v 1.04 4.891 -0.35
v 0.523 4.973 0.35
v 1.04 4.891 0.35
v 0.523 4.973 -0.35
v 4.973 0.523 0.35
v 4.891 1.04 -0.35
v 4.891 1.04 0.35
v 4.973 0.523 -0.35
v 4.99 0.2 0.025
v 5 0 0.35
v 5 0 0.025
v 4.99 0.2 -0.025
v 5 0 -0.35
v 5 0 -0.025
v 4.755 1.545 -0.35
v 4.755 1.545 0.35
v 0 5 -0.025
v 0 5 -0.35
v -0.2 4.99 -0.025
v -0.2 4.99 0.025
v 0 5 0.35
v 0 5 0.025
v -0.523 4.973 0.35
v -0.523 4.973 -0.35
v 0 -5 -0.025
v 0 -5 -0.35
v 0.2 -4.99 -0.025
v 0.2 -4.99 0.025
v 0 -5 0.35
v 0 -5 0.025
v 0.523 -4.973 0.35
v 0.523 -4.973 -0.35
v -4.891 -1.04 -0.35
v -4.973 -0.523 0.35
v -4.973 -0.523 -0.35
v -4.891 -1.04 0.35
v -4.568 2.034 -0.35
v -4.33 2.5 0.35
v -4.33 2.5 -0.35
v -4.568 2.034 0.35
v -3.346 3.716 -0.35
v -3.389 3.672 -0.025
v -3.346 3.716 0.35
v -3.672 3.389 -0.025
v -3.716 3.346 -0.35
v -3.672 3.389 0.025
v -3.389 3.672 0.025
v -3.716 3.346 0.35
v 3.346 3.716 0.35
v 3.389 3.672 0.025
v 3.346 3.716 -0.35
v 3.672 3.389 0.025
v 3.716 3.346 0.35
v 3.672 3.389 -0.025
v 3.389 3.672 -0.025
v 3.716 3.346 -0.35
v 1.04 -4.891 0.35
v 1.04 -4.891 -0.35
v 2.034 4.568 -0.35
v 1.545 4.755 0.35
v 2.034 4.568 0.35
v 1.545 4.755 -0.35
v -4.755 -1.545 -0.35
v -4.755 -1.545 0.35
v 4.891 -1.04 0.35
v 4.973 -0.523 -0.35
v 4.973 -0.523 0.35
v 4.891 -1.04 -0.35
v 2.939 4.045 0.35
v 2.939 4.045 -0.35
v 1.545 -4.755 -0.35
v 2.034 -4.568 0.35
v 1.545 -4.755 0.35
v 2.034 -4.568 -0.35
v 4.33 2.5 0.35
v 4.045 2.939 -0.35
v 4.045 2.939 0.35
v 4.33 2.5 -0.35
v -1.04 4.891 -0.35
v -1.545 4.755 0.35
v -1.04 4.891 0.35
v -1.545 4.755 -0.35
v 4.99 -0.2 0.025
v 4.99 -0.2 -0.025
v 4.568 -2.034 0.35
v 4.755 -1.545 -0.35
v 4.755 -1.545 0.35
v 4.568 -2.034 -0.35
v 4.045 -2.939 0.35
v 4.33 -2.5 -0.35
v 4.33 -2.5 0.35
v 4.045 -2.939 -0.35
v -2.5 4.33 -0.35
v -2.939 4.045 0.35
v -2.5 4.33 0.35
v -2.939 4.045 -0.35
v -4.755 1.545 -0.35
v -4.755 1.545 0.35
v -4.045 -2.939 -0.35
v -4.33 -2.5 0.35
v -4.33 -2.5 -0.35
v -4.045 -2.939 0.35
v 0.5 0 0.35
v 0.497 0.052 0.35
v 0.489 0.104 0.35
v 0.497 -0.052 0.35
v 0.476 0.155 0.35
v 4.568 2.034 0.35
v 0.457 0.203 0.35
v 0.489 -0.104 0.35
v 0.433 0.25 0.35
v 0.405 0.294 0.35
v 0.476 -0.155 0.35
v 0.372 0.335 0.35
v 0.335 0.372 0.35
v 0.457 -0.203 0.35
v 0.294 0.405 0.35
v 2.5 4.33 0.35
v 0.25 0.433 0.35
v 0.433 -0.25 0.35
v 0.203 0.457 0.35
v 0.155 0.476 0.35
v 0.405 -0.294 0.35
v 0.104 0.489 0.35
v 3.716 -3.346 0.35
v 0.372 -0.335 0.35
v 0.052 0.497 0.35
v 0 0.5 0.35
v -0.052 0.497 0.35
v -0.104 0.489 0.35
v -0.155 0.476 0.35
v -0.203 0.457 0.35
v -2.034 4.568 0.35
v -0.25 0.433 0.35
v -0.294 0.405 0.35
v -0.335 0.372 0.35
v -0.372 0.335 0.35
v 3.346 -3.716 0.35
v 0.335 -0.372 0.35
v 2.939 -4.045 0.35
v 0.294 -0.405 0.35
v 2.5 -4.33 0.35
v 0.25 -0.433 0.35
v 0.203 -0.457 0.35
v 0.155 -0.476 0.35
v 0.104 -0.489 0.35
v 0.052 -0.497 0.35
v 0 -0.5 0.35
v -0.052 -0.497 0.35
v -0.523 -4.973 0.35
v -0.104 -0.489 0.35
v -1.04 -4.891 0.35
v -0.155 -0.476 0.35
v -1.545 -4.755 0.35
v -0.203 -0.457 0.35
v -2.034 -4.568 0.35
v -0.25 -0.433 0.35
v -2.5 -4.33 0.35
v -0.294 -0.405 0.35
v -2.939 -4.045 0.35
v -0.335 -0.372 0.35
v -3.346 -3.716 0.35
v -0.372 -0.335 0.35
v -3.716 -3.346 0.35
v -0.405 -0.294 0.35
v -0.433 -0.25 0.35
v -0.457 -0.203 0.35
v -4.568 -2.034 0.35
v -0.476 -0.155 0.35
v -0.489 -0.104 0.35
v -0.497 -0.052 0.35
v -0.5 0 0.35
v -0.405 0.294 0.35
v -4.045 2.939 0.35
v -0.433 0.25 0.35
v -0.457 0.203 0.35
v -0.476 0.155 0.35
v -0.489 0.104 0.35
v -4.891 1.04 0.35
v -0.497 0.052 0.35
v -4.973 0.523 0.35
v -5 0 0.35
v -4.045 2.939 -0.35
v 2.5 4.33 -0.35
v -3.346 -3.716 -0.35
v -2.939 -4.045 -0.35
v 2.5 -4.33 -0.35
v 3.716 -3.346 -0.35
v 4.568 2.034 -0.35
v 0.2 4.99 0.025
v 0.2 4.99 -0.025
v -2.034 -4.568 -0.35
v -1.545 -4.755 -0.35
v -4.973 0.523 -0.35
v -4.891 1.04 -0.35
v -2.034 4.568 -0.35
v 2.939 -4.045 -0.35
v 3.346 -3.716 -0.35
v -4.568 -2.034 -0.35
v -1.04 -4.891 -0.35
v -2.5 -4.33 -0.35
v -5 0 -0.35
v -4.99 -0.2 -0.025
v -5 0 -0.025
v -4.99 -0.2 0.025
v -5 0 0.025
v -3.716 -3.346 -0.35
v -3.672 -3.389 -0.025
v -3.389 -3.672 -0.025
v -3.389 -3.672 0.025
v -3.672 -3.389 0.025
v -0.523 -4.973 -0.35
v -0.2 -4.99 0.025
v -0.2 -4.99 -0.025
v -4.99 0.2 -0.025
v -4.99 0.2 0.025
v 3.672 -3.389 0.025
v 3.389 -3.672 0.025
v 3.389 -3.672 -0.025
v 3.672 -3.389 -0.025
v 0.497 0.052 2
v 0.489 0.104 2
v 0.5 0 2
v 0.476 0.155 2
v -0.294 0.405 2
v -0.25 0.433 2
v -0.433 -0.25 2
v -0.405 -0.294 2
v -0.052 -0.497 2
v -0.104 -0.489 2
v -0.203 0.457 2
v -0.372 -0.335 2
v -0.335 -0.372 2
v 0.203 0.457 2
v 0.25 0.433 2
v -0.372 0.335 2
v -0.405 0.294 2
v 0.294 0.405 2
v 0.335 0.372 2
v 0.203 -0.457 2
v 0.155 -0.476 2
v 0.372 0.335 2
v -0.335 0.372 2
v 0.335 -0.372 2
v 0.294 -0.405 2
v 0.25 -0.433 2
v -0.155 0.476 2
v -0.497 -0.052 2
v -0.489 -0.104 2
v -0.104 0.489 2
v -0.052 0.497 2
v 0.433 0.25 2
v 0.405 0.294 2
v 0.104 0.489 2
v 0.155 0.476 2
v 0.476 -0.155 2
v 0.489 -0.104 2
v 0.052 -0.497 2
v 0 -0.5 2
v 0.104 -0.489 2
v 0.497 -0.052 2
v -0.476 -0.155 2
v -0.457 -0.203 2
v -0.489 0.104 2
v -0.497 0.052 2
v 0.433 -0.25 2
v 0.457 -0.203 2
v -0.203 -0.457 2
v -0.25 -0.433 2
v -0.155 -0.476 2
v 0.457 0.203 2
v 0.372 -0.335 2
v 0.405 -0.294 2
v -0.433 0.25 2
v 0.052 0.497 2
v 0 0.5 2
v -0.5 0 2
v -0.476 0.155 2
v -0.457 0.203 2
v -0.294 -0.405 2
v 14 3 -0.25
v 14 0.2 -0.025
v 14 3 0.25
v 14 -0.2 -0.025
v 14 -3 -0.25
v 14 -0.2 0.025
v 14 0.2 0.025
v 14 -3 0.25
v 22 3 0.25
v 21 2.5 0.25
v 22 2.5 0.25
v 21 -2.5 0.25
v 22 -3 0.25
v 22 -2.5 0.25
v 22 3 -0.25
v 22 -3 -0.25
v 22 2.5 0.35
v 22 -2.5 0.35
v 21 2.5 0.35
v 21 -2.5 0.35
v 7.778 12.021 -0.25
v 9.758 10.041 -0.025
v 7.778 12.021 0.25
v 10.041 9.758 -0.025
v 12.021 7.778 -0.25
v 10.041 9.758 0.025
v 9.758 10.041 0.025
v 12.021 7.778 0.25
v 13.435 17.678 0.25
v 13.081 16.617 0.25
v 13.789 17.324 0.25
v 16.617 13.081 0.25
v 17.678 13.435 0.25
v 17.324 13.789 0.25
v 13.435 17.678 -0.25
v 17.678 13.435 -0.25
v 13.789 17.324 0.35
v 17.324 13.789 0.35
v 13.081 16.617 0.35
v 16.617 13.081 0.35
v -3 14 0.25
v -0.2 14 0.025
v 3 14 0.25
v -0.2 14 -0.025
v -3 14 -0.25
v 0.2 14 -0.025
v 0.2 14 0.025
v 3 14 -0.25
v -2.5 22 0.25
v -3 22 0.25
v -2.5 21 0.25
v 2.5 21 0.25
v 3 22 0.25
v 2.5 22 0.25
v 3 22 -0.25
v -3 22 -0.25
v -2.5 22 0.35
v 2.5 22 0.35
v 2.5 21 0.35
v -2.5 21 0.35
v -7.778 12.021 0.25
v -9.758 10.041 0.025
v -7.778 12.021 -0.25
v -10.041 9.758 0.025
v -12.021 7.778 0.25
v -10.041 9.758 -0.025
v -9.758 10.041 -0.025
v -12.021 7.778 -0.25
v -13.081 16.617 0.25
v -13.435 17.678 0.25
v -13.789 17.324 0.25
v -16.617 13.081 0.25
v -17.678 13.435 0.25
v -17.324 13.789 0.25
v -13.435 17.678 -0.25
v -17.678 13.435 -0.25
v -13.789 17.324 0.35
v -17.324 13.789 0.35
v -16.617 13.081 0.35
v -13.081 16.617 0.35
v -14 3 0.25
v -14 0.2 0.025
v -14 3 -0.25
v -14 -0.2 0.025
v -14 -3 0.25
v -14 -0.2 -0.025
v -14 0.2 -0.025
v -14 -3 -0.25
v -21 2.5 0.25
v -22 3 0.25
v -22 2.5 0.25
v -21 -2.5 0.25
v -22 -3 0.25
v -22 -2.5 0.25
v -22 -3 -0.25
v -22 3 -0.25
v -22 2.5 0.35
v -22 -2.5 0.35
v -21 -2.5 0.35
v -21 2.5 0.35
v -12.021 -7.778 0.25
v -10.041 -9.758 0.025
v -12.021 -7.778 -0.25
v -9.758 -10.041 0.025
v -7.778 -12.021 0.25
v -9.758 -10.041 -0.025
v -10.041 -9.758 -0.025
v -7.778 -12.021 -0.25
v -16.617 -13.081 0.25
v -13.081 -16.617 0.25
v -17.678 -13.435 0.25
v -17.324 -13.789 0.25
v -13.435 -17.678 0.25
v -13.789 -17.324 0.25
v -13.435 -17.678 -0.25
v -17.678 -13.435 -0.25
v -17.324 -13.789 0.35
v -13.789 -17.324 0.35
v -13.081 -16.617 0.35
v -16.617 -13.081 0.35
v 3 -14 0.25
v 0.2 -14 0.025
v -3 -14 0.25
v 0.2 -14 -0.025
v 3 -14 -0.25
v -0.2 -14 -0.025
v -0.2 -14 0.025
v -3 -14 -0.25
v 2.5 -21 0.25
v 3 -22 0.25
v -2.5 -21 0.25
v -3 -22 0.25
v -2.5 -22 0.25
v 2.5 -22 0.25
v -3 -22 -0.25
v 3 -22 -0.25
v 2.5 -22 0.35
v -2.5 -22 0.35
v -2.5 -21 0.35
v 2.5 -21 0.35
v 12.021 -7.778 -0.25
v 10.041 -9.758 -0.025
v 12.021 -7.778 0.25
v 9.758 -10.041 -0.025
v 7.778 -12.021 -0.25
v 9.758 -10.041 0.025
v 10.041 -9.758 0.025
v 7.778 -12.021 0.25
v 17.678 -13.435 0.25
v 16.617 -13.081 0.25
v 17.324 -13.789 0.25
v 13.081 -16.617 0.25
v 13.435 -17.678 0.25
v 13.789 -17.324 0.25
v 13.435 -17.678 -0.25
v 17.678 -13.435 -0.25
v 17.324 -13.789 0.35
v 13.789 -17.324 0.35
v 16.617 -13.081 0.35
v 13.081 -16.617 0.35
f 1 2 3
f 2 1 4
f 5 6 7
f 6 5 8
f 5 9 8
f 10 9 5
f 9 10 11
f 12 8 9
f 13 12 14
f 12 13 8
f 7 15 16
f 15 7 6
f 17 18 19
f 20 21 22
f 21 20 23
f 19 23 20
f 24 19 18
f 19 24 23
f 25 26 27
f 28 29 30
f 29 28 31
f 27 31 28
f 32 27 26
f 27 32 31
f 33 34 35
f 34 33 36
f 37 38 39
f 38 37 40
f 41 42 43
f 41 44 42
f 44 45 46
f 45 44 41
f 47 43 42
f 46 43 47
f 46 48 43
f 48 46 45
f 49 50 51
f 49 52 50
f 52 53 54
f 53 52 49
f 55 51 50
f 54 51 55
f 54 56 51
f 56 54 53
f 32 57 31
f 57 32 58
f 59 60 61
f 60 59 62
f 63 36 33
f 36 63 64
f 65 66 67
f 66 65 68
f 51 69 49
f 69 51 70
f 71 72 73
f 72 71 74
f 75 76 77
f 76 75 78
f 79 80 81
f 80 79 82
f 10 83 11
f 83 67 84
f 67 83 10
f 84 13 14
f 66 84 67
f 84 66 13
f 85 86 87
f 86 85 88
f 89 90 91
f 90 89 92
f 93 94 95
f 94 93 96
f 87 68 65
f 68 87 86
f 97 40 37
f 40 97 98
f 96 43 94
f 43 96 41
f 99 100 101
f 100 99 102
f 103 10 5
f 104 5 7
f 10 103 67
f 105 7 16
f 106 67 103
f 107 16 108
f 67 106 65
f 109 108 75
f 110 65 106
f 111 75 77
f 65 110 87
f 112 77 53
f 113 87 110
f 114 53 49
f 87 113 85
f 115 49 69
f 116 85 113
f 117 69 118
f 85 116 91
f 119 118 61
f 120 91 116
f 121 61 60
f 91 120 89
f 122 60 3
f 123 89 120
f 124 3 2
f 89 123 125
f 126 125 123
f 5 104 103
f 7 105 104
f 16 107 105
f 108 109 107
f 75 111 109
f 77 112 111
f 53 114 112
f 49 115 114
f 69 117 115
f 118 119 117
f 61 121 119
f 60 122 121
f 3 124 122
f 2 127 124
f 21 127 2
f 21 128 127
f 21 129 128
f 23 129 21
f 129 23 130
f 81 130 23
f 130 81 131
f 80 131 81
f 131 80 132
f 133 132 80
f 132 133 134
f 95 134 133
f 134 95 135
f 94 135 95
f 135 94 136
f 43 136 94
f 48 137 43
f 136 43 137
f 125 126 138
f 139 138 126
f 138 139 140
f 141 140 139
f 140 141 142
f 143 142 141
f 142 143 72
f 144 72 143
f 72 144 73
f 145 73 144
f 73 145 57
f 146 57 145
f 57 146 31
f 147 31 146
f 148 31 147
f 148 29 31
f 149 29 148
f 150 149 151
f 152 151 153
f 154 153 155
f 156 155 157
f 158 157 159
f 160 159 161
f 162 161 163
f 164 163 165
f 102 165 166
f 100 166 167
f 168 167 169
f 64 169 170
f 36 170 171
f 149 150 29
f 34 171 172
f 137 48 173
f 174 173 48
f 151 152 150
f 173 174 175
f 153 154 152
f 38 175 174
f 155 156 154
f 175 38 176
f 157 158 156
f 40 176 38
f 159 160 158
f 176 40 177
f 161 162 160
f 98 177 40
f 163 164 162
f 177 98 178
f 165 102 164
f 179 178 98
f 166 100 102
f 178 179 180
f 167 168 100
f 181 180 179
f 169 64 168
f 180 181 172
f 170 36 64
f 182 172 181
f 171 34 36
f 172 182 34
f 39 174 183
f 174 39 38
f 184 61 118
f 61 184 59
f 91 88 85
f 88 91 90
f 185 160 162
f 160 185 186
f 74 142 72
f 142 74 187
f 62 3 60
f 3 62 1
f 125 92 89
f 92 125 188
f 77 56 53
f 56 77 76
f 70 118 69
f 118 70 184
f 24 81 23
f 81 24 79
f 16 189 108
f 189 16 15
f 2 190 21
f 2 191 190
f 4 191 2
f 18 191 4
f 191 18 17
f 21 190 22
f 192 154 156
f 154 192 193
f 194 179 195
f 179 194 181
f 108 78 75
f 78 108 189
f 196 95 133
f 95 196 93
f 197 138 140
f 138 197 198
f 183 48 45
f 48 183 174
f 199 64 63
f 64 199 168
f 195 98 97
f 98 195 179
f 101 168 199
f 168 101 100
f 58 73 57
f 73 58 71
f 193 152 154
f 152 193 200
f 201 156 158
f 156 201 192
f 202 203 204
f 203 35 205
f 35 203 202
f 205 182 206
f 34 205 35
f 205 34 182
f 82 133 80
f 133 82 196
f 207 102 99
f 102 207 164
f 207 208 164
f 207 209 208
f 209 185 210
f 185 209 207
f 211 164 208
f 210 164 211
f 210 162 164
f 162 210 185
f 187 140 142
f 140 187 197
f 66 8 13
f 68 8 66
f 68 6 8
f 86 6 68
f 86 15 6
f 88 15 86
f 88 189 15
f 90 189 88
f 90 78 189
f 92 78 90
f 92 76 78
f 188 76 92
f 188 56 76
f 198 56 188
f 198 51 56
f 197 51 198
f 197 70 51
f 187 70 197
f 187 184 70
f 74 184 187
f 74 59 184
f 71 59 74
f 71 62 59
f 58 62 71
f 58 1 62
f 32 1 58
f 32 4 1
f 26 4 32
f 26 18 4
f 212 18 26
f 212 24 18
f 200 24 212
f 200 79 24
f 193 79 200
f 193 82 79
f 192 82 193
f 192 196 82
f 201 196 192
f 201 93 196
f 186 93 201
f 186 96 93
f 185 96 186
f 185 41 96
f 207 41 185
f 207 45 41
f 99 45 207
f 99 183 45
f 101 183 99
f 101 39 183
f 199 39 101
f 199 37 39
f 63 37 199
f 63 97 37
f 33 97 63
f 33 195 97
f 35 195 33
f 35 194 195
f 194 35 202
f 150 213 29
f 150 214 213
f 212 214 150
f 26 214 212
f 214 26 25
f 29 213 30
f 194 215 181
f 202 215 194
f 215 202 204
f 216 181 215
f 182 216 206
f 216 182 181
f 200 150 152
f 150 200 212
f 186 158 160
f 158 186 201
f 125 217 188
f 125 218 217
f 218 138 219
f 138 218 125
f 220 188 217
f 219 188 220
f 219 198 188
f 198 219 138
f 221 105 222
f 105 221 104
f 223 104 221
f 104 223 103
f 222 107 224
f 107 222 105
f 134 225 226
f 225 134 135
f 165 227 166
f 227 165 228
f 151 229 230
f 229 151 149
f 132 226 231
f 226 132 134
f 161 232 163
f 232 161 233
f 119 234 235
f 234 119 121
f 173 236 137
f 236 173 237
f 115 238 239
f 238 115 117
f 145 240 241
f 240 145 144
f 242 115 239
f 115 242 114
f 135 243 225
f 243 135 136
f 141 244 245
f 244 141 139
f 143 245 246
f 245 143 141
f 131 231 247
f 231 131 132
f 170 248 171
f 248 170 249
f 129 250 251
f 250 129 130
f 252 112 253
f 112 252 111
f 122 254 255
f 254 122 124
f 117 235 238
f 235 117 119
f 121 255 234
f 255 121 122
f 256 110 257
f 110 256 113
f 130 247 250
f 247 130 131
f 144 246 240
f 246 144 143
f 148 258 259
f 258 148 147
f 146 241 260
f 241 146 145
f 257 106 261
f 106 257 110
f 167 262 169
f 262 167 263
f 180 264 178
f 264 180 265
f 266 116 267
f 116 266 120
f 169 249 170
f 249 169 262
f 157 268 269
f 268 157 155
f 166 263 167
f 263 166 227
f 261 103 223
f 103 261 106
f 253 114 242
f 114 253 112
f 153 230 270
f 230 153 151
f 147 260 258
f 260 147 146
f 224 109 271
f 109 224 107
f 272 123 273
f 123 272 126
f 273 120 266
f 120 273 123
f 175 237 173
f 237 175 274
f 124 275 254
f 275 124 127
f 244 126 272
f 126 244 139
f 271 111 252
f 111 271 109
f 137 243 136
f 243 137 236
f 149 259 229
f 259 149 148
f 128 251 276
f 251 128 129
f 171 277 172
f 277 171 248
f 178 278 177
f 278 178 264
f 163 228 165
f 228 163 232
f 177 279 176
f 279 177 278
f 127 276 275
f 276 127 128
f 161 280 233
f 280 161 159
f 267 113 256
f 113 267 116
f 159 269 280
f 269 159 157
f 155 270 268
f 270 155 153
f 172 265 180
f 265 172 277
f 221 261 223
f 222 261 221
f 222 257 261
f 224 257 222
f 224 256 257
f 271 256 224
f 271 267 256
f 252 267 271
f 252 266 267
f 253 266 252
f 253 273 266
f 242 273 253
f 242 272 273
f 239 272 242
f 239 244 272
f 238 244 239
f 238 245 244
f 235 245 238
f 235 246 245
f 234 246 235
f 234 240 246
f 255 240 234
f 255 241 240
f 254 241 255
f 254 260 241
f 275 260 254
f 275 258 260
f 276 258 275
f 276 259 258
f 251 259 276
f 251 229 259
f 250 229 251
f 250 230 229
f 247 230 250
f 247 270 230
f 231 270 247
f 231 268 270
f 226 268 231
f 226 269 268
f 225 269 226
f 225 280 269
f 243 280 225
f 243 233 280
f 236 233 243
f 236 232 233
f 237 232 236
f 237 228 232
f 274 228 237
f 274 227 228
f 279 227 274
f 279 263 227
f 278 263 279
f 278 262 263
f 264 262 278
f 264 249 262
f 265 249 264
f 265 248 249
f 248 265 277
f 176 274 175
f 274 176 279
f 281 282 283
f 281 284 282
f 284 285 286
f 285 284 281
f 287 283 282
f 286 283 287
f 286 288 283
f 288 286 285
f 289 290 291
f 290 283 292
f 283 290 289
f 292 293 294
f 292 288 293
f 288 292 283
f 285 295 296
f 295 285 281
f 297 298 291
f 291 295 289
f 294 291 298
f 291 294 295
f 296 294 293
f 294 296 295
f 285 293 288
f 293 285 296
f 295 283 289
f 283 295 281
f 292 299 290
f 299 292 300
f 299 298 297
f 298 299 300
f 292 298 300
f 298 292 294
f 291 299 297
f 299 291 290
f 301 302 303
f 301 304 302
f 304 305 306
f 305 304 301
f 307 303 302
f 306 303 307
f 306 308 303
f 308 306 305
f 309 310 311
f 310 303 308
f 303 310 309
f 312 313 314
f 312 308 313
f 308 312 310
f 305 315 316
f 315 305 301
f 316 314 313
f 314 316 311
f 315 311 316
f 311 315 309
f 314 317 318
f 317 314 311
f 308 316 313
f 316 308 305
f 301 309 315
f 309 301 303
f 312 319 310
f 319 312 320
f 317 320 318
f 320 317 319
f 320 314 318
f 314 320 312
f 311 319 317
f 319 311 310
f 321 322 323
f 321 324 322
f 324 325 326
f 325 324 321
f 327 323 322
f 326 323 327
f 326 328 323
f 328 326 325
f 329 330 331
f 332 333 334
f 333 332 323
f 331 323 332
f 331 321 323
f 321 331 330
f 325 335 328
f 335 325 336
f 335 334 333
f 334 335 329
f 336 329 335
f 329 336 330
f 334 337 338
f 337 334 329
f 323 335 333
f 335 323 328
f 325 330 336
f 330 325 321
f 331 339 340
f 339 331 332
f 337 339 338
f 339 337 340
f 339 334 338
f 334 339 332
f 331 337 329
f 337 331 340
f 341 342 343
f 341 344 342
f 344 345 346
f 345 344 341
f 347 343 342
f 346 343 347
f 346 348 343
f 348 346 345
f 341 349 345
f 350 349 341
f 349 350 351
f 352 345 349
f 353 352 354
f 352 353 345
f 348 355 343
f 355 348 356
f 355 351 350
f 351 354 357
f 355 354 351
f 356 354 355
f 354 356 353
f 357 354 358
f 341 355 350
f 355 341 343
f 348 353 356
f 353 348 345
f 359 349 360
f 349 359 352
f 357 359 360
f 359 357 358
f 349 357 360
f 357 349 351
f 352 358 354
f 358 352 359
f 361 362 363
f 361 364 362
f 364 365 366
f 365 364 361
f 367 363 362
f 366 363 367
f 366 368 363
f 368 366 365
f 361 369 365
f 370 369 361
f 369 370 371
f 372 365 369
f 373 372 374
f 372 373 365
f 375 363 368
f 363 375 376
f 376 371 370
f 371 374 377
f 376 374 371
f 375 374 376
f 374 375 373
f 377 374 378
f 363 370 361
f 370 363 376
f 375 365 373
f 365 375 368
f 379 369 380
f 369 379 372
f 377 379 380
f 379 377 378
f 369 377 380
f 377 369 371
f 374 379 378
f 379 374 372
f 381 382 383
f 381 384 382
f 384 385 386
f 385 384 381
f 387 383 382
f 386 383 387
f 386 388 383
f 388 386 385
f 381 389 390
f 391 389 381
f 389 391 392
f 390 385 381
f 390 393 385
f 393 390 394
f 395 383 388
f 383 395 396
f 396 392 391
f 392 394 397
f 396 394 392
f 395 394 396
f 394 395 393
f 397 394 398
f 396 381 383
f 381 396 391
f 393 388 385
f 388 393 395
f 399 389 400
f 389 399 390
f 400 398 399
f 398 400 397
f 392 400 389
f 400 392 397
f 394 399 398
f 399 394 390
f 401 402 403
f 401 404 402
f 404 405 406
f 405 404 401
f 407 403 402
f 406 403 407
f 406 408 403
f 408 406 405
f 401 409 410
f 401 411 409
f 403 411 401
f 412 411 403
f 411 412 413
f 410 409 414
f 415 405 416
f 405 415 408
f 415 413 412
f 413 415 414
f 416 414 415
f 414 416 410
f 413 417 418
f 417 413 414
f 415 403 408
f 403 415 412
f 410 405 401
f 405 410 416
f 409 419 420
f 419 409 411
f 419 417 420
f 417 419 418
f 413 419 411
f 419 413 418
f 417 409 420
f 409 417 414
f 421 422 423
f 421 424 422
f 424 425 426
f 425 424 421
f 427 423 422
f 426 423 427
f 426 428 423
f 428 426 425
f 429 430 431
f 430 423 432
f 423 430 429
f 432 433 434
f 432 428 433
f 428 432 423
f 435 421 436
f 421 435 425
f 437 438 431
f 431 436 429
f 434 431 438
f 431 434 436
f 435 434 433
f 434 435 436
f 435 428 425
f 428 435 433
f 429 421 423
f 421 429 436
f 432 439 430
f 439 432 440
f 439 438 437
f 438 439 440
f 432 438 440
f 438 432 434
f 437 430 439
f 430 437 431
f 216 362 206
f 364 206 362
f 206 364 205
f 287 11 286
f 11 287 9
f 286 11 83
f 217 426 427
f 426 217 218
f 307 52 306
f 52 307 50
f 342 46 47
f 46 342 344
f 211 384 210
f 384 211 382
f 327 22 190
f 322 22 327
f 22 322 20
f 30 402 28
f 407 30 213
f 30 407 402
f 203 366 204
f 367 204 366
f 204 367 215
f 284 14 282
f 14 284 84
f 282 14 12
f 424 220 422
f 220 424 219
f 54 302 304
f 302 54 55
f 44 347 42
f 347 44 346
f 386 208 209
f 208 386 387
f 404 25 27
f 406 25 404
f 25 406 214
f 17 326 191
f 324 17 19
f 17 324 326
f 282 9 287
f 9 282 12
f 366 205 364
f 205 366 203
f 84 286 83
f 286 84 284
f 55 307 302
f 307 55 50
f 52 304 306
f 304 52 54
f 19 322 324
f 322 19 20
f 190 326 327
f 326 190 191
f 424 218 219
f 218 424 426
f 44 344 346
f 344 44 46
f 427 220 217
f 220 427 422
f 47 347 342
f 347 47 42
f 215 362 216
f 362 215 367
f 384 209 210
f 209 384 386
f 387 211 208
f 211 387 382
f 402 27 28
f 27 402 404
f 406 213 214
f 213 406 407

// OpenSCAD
// ========================================================
// RT ARCHITECTURE - RADIAL / STAR CORE WAFER TOPOLOGY
// ========================================================

$fn = 60; // Model smooth lines

// --- Design Parameters ---
num_cores = 8;          // Number of processing cores facing center
die_radius = 18.0;      // Distance from center to core faces (mm)
core_w = 6.0;           // Width of an individual core tile
core_l = 8.0;           // Length of an individual core tile
core_h = 0.5;           // Silicon layer thickness
center_nexus_d = 10.0;  // Diameter of central crossbar / NoC router

module compute_core(id) {
    // Individual Core block with a color gradient accent
    color([0.2, 0.4, 0.1 + (id * 0.1)]) {
        cube([core_l, core_w, core_h], center=true);
        
        // Data Interface Port Indicator (Visual marker pointing inside)
        translate([-core_l/2 + 0.5, 0, core_h/2 + 0.05])
            color("Gold") cube([1, core_w - 1, 0.1], center=true);
    }
}

module central_router() {
    // The central network crossbar that all cores look at
    color("DarkRed") {
        cylinder(h=core_h + 0.2, d=center_nexus_d, center=true);
        // Central micro-via clock tower reference indicator
        translate([0,0,1]) cylinder(h=2, d=1, center=true);
    }
}

module interconnect_bus(angle) {
    // Radial trace lines connecting the core interfaces straight to center
    rotate([0, 0, angle])
        translate([die_radius / 2, 0, 0])
            color("Cyan", 0.6) 
                cube([die_radius, 0.4, 0.05], center=true);
}

module build_radial_processor() {
    // 1. Establish the Dead Center Nexus Point
    central_router();
    
    // 2. Map and Rotate Cores radially around the circle boundary
    for (i = [0 : num_cores - 1]) {
        current_angle = i * (360 / num_cores);
        
        // Render interconnect routing lines running inward
        interconnect_bus(current_angle);
        
        // Position and rotate the individual compute block
        rotate([0, 0, current_angle])
            translate([die_radius, 0, 0])
                rotate([0, 0, 180]) // Flips core front porch toward center
                    compute_core(i);
    }
}

// Instantiate the complete circular chip layout
build_radial_processor();
